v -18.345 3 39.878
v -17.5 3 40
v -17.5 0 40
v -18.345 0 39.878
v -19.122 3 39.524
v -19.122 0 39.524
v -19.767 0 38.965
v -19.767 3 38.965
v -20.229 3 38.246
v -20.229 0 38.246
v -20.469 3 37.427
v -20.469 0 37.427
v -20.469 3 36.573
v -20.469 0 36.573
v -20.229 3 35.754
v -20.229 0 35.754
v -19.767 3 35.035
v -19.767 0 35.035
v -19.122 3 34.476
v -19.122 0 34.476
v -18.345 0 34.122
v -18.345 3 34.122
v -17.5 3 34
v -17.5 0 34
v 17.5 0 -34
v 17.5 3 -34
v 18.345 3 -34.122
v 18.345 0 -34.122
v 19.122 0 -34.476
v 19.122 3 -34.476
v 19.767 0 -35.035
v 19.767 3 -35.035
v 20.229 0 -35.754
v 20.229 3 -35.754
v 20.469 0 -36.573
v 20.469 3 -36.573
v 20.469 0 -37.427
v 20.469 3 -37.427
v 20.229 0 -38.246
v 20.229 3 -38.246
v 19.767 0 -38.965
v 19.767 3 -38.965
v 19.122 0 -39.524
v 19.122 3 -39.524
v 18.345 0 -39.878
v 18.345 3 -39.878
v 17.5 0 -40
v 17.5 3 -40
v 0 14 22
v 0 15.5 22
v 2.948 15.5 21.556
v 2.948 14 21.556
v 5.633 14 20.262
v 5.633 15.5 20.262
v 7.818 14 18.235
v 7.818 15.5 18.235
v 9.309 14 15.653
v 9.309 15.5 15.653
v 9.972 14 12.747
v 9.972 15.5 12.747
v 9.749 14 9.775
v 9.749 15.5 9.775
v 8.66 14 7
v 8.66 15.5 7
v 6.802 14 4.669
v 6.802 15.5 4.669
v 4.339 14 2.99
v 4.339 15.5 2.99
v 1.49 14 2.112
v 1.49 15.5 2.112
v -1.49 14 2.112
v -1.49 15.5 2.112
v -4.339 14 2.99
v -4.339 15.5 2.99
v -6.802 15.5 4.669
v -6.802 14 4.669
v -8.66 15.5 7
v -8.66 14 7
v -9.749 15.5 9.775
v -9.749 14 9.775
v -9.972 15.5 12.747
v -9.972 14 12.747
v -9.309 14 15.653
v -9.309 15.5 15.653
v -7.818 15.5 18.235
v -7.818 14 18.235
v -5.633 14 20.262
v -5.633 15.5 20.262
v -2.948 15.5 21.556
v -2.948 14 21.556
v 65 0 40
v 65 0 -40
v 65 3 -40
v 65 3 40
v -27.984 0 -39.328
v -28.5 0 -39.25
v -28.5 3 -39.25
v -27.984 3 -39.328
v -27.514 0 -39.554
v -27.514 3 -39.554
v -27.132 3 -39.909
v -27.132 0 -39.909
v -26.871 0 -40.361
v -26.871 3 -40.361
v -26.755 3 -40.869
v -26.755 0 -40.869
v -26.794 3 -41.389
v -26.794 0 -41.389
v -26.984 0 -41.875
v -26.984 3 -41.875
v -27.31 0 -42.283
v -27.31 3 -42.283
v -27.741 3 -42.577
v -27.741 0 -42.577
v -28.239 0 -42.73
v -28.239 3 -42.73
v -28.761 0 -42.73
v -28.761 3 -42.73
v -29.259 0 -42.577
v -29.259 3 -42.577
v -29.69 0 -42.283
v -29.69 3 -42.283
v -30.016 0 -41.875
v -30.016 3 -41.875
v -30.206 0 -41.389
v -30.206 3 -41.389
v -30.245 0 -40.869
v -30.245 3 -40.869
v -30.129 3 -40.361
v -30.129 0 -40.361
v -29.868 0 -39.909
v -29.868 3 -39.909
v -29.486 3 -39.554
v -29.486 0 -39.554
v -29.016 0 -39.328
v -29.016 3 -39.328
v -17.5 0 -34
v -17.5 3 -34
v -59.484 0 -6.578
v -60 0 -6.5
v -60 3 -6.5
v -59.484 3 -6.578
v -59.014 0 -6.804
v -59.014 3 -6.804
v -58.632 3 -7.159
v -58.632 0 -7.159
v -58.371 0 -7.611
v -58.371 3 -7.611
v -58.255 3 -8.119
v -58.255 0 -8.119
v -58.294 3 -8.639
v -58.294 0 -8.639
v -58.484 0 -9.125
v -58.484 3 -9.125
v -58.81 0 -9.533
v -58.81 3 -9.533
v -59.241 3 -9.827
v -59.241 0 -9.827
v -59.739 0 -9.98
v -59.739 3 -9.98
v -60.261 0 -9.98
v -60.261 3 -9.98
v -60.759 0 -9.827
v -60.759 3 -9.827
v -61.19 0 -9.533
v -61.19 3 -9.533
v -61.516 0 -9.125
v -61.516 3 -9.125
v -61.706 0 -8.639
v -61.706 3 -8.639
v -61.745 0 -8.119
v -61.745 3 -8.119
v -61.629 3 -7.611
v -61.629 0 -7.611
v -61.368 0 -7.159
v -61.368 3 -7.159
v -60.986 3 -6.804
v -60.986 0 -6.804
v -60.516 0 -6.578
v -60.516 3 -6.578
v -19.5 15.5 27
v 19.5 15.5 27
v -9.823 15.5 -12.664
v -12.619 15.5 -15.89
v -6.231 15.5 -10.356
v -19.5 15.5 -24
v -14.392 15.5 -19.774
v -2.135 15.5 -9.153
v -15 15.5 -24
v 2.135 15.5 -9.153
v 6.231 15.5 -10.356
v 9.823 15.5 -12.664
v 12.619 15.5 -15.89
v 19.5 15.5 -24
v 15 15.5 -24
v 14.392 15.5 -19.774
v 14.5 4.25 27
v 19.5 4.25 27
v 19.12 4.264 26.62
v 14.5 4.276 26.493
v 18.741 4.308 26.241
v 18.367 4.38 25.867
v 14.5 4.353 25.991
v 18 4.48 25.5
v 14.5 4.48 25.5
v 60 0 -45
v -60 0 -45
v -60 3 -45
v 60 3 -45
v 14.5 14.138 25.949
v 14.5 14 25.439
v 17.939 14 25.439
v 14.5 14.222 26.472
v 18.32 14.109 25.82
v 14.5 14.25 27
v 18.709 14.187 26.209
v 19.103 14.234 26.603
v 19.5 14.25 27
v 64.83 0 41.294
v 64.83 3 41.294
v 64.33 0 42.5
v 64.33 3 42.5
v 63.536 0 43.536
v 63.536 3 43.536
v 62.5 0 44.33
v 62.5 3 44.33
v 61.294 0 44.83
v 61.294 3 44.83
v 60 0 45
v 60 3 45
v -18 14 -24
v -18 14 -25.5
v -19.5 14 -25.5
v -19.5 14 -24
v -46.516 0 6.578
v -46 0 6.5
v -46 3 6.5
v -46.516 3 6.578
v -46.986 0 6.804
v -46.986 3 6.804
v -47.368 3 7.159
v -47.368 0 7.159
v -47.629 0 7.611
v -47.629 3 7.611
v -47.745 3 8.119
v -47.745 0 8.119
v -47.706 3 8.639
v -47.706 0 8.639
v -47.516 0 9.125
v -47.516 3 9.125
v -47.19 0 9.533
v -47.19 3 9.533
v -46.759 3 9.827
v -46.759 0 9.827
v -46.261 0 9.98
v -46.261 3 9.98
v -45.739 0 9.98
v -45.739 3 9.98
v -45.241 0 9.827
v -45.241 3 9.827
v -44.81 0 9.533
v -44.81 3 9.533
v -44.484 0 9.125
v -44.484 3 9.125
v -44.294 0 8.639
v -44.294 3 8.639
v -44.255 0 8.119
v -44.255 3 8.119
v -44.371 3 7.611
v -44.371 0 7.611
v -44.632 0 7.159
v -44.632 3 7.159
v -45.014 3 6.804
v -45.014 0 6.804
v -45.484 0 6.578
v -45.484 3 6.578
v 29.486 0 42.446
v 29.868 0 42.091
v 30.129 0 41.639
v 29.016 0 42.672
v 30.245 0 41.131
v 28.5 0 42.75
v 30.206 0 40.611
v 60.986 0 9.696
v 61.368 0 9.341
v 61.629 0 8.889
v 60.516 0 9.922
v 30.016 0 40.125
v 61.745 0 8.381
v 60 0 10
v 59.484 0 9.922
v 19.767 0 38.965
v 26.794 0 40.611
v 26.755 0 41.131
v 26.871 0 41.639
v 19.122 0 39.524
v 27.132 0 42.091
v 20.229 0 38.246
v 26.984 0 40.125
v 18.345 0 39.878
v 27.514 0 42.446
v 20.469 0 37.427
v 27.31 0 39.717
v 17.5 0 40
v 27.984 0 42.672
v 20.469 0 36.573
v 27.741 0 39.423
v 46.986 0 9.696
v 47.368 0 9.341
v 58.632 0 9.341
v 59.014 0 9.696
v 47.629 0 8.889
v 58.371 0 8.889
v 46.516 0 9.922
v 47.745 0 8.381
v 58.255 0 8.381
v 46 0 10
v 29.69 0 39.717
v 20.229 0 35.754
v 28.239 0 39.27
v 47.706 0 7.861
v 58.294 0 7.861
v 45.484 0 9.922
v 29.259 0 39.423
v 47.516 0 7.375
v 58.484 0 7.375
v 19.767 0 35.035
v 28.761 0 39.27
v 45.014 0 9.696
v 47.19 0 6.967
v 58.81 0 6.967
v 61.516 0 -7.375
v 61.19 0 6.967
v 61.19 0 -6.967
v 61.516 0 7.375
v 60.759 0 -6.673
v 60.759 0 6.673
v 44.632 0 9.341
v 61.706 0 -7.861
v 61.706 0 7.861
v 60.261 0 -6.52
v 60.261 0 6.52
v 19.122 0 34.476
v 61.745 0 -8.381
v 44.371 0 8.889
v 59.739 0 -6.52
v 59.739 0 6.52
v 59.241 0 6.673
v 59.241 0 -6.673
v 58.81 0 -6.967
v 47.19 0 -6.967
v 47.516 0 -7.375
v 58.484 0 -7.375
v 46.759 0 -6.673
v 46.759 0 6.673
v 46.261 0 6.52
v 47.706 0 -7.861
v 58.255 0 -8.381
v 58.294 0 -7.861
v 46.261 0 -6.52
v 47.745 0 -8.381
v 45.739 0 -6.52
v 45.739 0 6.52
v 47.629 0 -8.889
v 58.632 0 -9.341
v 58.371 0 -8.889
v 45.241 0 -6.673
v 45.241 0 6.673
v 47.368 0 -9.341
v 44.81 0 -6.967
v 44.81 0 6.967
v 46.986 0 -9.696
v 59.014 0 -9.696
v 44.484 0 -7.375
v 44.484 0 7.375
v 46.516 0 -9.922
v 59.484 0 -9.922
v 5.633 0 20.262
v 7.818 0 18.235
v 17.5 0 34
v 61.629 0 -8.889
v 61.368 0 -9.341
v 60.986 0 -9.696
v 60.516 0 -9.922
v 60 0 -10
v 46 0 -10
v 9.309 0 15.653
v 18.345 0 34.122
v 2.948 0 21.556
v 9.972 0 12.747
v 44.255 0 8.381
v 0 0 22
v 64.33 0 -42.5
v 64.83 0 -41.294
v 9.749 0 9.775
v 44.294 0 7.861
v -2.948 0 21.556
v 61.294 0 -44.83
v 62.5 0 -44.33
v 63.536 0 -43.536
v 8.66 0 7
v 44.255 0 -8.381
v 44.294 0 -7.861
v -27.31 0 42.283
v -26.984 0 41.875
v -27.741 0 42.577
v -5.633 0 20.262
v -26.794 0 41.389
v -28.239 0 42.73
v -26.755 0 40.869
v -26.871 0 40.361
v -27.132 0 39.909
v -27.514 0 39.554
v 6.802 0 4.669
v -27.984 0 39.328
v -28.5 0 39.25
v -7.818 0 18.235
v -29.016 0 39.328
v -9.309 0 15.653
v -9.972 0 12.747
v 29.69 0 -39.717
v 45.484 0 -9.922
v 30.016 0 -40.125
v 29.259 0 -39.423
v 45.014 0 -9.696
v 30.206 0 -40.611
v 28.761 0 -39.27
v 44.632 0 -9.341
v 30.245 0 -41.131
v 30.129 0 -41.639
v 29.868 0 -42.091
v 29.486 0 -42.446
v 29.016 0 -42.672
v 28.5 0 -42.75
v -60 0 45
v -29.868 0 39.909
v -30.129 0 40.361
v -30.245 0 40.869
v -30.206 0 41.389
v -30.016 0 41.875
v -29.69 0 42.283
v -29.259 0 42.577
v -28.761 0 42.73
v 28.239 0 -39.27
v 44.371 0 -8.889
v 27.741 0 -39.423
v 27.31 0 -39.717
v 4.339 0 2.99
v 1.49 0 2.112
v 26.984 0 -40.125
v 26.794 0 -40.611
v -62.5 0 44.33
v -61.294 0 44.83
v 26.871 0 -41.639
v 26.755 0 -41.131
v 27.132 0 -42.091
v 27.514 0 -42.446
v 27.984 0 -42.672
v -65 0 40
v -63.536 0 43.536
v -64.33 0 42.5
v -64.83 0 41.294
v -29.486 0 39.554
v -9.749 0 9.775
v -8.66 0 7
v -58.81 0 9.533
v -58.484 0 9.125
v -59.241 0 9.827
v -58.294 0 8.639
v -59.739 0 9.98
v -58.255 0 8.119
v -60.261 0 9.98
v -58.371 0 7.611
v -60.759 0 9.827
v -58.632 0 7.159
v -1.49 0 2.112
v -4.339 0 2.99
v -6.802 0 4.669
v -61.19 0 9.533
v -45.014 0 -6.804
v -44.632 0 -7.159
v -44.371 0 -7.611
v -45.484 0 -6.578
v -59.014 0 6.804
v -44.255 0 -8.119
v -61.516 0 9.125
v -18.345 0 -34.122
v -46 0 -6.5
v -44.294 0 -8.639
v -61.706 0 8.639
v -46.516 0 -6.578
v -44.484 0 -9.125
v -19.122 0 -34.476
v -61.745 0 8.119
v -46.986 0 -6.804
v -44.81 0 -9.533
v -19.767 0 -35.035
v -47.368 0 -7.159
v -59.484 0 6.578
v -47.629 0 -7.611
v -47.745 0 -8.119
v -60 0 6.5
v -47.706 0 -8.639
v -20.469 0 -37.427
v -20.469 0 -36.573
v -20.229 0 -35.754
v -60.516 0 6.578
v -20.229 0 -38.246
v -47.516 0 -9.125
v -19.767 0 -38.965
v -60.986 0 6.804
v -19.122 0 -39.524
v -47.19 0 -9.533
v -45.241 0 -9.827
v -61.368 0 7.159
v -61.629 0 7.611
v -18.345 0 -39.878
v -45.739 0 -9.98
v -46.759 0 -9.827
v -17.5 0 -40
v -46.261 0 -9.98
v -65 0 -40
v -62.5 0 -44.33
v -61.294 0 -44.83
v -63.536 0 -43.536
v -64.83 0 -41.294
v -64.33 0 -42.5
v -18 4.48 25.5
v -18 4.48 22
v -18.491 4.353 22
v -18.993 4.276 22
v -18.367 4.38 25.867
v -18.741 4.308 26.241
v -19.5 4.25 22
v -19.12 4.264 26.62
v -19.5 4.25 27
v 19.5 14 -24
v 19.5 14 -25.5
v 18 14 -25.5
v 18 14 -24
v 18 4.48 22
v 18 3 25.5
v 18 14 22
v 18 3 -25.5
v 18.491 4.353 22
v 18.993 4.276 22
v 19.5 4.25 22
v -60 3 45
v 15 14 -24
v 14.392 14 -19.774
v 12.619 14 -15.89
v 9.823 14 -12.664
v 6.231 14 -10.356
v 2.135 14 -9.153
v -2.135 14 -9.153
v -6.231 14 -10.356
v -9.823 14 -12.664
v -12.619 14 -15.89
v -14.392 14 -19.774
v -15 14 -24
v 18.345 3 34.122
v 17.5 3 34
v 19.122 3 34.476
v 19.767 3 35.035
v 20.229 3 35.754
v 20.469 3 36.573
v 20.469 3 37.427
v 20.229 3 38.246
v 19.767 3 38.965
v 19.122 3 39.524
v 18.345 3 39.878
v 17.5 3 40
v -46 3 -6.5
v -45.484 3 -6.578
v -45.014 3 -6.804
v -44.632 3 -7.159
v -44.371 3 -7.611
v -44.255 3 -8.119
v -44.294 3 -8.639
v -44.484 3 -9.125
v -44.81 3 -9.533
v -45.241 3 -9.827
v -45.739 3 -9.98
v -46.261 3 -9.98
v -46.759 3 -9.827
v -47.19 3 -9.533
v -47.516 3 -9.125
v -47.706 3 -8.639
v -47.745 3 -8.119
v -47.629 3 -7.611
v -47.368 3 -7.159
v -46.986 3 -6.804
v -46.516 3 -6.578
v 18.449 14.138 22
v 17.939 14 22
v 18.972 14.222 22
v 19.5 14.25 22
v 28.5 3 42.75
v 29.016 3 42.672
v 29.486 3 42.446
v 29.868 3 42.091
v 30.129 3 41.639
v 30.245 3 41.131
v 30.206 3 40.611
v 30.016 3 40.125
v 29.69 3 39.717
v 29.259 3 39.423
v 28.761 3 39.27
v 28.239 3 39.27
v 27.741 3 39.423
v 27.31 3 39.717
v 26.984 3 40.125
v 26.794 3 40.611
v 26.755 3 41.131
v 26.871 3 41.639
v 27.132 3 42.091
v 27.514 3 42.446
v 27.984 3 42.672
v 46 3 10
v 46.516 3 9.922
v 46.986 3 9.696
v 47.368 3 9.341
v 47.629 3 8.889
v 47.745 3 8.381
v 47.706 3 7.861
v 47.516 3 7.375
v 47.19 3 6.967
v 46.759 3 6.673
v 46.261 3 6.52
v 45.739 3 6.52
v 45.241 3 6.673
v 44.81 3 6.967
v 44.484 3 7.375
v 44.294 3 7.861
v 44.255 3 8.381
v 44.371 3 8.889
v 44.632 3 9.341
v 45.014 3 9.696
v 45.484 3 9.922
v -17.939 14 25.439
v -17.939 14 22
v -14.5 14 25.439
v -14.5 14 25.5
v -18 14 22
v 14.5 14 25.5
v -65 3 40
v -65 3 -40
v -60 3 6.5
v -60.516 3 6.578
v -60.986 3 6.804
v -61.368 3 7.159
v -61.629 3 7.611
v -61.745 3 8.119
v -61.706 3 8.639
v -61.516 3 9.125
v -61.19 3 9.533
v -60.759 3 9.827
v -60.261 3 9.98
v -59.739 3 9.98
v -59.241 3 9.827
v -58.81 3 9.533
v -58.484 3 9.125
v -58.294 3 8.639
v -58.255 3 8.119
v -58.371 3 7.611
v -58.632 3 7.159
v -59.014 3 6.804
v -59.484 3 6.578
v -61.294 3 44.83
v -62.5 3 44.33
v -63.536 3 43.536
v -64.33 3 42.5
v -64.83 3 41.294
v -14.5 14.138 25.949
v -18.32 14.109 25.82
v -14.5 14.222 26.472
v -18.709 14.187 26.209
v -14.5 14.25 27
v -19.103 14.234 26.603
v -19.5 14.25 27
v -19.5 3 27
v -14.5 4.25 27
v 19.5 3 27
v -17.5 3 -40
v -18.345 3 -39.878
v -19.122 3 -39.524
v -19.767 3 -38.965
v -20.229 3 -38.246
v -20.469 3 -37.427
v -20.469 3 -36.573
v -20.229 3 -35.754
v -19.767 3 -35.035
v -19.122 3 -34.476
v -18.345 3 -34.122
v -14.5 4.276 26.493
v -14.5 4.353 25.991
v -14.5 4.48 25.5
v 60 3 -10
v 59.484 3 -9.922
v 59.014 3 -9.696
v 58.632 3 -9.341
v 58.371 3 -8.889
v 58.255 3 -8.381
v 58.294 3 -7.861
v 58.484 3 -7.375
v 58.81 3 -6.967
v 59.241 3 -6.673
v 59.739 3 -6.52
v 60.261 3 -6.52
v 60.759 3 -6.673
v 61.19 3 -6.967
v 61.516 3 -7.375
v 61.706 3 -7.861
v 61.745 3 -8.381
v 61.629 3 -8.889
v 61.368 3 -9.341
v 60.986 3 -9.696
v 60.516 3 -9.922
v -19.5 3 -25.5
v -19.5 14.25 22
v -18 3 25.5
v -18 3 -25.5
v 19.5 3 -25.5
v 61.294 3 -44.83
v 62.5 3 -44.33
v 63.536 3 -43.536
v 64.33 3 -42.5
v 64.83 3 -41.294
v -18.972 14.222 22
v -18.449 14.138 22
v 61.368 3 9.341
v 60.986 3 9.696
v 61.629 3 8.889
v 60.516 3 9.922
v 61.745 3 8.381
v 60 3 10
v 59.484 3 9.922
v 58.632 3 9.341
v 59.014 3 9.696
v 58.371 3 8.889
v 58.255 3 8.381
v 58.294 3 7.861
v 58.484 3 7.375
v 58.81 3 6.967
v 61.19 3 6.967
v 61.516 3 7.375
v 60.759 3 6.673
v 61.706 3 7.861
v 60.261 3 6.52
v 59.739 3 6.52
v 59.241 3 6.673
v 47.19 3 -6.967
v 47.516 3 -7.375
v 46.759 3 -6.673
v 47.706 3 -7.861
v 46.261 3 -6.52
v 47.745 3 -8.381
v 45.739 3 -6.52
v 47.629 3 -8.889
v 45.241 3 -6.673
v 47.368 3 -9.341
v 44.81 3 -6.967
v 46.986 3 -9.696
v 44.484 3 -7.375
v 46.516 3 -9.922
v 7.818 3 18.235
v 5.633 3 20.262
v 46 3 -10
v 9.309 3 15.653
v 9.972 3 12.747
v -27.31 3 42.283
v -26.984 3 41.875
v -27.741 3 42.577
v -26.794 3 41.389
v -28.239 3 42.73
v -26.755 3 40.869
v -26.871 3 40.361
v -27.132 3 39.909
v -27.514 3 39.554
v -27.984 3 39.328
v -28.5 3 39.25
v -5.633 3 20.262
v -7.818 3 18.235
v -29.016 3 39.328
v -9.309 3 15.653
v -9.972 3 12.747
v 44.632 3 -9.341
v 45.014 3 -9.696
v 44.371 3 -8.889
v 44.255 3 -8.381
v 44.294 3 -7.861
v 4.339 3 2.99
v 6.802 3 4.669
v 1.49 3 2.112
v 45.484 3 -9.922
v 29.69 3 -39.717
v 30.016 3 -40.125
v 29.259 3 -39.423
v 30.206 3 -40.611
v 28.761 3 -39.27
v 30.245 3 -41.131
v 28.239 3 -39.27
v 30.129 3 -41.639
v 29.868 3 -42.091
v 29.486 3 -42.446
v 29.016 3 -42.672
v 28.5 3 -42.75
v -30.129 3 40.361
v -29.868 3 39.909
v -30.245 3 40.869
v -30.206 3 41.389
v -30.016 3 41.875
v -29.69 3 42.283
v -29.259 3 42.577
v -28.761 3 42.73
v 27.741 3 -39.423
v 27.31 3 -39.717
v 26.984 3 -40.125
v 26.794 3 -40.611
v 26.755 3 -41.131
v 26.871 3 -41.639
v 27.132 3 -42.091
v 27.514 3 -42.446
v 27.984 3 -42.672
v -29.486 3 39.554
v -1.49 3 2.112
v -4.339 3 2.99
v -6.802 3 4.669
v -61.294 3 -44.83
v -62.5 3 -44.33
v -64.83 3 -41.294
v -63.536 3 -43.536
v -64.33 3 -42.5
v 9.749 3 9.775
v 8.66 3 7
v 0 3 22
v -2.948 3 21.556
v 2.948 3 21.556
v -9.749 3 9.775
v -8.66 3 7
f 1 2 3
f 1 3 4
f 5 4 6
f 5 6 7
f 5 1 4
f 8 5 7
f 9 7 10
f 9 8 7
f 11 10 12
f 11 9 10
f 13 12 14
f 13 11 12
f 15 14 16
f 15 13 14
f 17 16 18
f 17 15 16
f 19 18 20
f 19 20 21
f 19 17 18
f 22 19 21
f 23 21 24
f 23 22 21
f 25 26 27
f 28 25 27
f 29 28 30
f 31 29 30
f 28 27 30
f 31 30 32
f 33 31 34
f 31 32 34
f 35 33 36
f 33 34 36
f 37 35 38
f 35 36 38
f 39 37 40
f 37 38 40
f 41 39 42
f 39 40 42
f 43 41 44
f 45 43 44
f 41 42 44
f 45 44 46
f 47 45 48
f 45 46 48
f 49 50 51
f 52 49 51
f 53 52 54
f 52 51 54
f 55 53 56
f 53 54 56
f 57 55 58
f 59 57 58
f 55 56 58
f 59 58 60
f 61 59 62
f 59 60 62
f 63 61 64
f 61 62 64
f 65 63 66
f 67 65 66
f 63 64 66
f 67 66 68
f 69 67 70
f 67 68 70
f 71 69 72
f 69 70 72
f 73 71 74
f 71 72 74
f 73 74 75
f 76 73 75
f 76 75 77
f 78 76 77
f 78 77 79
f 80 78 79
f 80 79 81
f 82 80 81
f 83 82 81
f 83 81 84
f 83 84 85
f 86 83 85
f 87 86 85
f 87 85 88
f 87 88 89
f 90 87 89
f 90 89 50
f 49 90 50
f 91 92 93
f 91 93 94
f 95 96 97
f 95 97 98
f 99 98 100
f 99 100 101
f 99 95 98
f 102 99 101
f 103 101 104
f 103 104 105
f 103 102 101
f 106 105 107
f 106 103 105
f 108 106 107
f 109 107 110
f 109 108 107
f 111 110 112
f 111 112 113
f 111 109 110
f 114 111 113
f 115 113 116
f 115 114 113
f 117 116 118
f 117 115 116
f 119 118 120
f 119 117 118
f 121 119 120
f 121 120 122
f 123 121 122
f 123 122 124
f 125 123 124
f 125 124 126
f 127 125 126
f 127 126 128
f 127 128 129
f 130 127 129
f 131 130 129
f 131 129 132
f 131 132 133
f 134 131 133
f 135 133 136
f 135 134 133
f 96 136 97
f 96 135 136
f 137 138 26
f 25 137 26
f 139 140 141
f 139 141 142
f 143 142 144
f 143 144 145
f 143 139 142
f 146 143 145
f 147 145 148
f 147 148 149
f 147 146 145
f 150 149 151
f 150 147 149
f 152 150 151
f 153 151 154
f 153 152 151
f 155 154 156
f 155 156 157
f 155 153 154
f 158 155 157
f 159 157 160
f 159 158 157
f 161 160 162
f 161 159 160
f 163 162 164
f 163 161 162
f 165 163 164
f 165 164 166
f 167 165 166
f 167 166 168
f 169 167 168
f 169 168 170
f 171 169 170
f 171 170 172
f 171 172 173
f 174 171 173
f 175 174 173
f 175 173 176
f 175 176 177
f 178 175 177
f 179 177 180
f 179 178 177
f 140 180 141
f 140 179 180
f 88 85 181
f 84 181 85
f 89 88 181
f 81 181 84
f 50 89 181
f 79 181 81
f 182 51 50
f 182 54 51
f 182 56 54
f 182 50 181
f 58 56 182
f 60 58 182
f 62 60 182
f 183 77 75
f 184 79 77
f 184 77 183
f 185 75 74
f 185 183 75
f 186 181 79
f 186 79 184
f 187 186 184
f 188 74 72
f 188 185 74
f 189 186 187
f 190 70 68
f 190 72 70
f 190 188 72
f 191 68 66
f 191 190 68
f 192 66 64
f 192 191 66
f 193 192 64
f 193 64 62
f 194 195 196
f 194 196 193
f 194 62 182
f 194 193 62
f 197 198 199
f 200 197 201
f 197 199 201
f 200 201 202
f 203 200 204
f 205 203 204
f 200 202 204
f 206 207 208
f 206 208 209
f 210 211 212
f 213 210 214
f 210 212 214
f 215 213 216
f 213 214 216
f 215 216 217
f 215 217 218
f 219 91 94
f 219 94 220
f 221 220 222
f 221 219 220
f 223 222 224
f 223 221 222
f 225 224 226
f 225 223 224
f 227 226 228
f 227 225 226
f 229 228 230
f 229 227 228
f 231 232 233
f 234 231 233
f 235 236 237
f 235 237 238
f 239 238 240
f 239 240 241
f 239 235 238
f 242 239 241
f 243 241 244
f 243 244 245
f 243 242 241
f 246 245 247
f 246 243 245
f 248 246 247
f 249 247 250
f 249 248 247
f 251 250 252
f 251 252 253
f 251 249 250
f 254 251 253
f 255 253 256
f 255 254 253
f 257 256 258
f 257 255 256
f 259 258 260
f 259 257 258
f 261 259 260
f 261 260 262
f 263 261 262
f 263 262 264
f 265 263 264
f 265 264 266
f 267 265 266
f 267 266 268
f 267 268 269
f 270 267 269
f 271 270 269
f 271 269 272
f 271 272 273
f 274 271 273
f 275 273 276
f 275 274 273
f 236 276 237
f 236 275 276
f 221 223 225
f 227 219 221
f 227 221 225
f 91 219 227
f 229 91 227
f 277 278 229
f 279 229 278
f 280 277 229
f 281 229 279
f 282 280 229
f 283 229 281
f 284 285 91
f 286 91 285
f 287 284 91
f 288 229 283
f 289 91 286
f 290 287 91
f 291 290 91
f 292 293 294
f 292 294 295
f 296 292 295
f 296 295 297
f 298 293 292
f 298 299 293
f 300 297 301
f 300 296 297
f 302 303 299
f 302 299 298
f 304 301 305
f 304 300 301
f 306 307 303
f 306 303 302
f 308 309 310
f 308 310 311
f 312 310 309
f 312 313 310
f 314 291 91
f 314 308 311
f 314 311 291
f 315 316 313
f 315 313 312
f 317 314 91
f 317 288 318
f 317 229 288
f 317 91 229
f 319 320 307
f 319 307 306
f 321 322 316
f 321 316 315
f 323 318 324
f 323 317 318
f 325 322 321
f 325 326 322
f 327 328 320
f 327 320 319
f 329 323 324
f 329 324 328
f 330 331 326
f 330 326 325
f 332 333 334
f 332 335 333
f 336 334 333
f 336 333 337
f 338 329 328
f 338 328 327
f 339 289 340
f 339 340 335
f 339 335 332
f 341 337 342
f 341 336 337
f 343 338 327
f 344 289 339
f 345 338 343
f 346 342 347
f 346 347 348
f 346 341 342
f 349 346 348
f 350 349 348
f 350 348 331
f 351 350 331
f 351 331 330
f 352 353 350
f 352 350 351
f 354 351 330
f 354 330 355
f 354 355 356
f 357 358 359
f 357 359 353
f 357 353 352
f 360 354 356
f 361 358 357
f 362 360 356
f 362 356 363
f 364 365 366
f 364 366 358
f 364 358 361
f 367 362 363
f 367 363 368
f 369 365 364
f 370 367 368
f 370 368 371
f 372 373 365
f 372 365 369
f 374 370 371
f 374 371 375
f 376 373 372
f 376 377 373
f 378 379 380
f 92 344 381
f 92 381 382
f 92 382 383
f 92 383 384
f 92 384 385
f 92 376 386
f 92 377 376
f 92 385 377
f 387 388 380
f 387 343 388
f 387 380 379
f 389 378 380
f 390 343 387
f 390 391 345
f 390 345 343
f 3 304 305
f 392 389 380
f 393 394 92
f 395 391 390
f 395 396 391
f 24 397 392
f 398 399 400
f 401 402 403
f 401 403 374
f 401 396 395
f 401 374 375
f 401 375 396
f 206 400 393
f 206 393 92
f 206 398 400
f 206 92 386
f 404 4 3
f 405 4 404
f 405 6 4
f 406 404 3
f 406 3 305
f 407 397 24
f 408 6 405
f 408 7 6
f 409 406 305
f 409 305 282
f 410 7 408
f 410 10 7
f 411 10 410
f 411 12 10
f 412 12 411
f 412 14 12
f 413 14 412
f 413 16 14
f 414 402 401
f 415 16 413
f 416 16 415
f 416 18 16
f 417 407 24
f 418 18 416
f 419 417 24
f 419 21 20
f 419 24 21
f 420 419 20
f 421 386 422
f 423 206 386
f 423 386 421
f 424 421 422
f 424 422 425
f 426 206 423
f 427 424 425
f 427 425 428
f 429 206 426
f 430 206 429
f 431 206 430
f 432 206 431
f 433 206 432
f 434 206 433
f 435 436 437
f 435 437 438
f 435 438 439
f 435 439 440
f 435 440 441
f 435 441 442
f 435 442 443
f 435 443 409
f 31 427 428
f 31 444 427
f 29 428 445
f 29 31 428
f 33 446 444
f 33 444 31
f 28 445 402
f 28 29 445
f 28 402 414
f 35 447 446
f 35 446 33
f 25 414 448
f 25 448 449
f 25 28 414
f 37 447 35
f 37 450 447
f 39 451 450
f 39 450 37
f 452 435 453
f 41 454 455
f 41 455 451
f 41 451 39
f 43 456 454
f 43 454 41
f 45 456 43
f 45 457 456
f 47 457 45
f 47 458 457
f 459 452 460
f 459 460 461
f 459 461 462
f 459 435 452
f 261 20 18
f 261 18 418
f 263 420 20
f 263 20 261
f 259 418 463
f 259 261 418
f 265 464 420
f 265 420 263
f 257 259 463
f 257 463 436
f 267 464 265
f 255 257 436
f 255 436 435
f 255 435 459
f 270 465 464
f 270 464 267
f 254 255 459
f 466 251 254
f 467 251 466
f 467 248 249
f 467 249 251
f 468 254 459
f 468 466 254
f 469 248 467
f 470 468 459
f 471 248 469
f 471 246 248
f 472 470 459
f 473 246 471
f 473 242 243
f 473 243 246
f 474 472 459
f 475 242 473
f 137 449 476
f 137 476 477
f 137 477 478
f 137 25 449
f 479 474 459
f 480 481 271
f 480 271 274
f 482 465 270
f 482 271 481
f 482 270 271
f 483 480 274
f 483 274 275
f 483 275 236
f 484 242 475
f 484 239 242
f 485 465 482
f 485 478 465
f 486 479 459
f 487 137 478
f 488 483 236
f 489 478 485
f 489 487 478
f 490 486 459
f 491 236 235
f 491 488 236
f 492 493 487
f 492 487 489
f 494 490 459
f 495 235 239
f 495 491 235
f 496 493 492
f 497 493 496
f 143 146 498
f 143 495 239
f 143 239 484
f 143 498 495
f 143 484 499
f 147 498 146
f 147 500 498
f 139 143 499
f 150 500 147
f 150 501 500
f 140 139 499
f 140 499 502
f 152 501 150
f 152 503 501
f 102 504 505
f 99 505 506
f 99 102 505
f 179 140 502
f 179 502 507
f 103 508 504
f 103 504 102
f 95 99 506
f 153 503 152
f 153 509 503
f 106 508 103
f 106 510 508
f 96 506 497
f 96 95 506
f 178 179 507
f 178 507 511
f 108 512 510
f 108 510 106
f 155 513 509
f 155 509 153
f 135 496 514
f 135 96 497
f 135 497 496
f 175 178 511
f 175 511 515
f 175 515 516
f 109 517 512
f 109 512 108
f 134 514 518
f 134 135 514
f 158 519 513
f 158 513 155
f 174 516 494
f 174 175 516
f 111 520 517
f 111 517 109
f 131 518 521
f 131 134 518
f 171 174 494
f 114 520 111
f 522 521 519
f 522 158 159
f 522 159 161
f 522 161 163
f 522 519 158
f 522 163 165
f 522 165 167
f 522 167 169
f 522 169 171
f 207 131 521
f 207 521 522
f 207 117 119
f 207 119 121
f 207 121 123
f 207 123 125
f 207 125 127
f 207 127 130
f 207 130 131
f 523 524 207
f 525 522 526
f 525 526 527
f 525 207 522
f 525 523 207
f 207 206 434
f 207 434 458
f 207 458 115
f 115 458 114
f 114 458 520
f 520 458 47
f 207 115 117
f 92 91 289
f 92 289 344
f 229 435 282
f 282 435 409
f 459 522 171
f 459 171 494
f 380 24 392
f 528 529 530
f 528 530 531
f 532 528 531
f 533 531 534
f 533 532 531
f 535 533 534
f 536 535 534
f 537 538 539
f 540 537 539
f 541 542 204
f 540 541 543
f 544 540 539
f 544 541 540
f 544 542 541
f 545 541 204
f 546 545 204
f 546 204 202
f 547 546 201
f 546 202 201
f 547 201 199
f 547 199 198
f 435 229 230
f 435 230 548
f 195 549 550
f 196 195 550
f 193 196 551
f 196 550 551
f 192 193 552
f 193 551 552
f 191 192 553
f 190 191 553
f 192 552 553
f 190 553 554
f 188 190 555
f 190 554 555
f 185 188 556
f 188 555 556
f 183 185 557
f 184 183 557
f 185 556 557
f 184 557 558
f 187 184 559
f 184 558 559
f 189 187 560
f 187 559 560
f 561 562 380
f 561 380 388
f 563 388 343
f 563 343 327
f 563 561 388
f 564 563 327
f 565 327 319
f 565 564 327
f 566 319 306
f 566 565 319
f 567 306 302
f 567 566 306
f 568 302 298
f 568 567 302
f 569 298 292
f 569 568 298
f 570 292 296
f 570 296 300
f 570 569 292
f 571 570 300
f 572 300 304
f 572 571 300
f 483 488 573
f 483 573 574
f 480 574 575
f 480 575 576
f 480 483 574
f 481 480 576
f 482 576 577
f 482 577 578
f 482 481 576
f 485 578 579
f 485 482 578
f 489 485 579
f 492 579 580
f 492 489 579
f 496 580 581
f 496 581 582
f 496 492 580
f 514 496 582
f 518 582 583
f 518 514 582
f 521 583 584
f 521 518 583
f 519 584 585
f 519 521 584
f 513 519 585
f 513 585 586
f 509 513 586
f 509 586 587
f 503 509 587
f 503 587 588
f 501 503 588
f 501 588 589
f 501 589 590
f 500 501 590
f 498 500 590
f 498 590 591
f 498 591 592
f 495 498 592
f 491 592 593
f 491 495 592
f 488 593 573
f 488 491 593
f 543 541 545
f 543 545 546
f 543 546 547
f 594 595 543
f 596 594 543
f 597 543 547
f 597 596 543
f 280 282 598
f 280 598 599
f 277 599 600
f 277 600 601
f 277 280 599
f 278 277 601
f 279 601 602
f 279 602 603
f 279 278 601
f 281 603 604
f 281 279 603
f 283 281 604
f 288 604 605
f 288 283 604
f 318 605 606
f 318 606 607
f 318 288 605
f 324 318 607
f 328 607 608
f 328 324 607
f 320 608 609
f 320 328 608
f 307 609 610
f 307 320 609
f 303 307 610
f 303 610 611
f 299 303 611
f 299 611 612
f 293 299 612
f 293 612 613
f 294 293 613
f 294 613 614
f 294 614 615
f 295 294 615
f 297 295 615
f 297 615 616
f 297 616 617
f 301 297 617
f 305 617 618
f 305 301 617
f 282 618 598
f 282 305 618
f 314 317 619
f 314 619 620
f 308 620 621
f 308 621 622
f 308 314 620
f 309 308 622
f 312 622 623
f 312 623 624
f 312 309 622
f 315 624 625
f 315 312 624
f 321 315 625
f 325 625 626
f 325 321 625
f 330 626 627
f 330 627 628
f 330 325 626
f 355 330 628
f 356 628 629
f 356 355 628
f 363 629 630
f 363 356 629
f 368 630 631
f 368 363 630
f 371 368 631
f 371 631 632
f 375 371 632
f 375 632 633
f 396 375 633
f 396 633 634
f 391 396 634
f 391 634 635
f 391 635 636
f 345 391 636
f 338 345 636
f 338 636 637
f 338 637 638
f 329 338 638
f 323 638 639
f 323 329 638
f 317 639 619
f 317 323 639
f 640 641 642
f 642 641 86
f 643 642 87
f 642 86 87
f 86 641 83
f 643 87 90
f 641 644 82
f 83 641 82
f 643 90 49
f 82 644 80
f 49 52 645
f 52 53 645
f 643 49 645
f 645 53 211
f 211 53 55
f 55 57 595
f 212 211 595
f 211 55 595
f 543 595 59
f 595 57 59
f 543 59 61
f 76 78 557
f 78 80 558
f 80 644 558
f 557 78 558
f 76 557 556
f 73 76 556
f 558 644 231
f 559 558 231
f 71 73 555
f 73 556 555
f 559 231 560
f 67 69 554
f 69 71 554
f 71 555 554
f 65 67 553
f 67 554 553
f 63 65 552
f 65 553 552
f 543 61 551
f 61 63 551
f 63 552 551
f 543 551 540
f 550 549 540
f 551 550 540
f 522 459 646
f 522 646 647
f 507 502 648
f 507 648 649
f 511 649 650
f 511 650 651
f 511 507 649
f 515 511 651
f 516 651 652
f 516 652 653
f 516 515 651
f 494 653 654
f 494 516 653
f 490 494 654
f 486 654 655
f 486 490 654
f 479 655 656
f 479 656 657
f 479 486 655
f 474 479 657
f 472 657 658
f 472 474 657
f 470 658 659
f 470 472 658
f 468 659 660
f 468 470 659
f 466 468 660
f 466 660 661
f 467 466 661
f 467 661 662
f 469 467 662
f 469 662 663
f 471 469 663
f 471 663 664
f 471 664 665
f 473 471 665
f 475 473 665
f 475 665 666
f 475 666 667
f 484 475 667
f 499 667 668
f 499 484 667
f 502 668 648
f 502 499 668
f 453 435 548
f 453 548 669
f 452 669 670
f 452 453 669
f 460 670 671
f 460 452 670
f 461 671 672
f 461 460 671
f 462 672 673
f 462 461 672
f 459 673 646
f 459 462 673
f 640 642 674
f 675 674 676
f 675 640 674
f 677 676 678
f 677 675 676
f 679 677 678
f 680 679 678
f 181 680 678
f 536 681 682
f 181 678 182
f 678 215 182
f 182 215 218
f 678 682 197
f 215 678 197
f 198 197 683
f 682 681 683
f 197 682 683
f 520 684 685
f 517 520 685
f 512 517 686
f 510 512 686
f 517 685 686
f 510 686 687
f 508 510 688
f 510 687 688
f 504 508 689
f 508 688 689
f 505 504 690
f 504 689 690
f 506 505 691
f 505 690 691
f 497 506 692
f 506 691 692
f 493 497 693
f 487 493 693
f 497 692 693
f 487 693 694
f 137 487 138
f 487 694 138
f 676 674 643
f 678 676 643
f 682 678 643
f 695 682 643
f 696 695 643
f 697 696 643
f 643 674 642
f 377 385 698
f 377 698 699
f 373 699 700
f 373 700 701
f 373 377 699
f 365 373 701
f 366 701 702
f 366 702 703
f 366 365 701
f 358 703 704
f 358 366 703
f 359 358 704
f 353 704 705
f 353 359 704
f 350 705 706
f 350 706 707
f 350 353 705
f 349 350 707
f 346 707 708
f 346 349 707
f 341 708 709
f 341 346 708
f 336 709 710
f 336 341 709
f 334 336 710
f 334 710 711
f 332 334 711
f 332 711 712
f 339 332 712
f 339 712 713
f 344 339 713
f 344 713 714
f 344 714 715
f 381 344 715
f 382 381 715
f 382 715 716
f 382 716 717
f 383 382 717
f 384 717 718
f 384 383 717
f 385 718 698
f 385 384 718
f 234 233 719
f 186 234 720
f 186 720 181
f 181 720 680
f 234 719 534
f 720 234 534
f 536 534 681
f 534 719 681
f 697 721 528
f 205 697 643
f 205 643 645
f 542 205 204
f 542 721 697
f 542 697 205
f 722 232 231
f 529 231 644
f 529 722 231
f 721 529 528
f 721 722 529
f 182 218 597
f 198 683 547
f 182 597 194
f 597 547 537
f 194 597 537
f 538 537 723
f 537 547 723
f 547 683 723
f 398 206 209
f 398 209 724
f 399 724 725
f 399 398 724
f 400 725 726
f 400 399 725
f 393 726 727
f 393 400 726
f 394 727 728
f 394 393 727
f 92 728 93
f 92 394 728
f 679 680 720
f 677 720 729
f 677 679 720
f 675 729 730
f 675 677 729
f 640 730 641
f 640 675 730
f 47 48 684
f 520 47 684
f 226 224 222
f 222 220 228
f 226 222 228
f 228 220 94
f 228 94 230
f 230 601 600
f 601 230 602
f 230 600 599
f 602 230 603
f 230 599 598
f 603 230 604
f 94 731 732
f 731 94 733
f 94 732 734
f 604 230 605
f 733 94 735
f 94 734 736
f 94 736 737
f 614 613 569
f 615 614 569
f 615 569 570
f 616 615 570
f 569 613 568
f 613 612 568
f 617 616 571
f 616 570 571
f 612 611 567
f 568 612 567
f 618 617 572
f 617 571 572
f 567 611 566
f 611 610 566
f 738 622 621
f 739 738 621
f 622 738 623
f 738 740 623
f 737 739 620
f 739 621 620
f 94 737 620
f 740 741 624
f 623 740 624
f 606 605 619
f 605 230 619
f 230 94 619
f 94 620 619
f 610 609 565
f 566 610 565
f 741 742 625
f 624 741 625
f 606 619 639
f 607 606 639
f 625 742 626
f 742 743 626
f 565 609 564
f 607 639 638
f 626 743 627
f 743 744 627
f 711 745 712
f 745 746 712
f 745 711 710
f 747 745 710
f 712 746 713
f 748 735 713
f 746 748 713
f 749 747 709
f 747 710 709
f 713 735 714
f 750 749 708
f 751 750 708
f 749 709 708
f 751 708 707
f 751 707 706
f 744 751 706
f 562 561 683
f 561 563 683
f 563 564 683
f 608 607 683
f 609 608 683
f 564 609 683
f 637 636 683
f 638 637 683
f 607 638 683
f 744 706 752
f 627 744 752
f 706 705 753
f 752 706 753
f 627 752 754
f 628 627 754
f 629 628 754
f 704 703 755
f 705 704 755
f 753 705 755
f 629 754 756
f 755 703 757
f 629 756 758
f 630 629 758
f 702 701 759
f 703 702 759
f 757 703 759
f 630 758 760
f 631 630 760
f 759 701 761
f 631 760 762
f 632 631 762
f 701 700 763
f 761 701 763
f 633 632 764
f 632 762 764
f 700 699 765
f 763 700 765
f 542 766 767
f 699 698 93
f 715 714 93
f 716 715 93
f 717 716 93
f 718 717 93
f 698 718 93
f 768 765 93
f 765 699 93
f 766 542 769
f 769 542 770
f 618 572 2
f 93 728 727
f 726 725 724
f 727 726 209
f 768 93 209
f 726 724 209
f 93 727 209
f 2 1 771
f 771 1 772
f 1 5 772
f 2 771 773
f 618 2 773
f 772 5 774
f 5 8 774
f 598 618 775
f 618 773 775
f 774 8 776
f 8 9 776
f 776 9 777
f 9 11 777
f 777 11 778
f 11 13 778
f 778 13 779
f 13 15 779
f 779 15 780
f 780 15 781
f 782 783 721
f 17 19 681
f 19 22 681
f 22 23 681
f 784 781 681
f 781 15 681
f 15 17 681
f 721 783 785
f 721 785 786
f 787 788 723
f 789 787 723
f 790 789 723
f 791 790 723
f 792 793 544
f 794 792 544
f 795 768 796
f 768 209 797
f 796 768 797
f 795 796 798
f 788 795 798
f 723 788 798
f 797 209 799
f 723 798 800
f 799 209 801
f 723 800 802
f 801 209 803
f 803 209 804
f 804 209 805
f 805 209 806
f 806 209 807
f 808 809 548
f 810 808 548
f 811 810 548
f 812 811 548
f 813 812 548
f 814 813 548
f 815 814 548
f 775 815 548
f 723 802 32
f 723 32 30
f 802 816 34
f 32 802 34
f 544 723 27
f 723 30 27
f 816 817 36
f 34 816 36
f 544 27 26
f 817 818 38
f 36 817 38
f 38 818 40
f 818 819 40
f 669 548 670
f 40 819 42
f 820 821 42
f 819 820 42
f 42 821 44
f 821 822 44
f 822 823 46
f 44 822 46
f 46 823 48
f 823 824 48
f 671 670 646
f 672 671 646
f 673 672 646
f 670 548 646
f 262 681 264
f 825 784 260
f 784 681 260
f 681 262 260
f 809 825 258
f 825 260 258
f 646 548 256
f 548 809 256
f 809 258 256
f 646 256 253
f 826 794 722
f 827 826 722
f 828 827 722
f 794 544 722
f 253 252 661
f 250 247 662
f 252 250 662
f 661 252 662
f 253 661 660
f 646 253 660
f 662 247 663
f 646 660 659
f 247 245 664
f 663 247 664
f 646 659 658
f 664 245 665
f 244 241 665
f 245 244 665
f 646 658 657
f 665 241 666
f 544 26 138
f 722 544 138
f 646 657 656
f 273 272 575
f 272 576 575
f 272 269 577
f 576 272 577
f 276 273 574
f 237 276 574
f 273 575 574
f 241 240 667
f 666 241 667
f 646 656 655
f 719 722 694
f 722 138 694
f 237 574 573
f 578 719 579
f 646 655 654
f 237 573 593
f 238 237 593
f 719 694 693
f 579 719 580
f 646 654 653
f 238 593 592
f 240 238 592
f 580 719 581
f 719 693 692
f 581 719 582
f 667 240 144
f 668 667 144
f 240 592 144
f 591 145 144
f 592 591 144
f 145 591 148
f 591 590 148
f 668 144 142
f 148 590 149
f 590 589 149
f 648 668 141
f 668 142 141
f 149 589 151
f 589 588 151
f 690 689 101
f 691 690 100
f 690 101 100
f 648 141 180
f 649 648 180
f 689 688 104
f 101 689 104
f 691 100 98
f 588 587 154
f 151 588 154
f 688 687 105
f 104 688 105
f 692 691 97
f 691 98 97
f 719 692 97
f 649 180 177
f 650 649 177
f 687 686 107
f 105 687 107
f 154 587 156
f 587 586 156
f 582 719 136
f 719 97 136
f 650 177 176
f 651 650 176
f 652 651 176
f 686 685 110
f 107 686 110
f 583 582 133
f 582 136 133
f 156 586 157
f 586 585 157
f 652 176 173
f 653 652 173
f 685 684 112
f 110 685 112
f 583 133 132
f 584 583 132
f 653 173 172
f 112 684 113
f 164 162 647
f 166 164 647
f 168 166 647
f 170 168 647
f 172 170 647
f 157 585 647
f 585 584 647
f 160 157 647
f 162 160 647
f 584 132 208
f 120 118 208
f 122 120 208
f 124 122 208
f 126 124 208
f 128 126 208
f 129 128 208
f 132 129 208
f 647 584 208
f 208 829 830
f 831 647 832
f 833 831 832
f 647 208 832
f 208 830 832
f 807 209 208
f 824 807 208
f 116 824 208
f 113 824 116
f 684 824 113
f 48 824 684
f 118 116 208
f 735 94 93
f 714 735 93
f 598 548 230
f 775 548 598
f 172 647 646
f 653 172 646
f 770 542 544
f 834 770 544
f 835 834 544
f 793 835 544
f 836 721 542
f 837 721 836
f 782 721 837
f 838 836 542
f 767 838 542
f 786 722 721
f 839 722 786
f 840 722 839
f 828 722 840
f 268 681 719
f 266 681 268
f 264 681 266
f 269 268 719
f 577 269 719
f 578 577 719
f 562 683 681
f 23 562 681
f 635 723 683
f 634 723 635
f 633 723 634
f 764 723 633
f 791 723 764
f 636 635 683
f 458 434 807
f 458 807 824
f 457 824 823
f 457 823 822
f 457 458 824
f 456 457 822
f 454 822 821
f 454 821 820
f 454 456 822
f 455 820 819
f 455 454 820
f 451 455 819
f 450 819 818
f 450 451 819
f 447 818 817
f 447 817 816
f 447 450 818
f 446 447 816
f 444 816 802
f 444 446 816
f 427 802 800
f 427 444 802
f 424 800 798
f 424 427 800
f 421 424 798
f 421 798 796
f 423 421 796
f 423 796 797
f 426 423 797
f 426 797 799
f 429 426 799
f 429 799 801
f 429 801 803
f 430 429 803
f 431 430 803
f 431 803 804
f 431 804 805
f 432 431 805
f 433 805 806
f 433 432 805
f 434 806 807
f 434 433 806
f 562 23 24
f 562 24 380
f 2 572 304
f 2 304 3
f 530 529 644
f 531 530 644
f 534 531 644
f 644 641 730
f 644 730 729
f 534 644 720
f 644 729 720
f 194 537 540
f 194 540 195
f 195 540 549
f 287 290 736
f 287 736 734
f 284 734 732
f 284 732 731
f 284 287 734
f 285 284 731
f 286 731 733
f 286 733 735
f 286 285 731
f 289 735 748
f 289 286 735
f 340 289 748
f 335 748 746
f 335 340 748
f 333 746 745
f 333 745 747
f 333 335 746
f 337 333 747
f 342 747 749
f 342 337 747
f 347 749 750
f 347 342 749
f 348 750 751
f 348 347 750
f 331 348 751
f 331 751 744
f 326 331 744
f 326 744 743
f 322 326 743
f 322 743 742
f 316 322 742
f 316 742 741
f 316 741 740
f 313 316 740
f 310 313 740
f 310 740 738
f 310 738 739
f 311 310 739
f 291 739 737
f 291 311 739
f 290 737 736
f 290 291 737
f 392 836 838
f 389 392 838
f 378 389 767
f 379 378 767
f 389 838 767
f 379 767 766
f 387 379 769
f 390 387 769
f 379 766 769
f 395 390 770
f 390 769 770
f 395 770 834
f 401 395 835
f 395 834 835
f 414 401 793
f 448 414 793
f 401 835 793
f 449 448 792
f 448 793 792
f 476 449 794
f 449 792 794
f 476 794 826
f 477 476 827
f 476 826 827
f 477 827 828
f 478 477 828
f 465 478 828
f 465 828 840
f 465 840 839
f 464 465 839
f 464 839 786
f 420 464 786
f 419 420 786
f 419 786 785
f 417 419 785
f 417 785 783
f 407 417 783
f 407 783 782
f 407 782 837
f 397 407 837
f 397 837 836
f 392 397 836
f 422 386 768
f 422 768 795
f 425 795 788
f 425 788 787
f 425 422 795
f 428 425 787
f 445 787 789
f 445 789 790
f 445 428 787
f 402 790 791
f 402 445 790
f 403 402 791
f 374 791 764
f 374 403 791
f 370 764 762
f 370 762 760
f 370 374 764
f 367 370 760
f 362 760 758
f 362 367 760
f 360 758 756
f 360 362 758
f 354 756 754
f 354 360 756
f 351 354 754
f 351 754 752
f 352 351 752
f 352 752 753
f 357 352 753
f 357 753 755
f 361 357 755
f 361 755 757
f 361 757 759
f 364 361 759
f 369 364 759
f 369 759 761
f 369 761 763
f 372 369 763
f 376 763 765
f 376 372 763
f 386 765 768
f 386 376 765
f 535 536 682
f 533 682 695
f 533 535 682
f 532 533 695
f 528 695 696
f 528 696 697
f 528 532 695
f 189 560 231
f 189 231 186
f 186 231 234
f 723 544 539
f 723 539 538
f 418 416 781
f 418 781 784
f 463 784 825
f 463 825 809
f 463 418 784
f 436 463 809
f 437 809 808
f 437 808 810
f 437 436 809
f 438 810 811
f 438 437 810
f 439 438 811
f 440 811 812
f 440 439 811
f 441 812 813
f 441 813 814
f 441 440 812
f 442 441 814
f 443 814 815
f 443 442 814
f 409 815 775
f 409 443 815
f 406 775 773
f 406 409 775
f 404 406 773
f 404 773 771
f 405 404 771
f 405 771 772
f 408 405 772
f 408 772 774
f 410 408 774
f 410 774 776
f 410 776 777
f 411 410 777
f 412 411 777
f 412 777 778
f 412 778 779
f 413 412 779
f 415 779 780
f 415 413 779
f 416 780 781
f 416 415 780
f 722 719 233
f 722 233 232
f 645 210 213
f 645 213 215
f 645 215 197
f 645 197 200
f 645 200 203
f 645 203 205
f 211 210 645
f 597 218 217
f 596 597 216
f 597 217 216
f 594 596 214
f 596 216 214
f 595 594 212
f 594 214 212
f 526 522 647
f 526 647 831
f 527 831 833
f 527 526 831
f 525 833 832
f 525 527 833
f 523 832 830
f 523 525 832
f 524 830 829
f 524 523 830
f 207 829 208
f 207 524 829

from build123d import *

# Parameters (mm, degrees)
SKETCH_1_R          = 1.75
EXTRUDE_1_DEPTH     = 3
EXTRUDE_2_DEPTH     = 11
EXTRUDE_3_DEPTH     = 1.5
SKETCH_5_R          = 10
CUT_EXTRUDE_1_DEPTH = 81.562087858
SKETCH_6_R          = 5
CUT_EXTRUDE_2_DEPTH = 5
SKETCH_7_R          = 5
CUT_EXTRUDE_3_DEPTH = 5
CUT_EXTRUDE_4_DEPTH = 3


with BuildPart() as part:
    # 草图1 → 凸台-拉伸1 (new body)
    with BuildSketch(Plane(origin=(0, 0, 0), x_dir=(1, 0, 0), z_dir=(0, 1, 0))):
        with BuildLine():
            Line((-60, 45), (60, 45))
            ThreePointArc((60, 45), (63.535533906, 43.535533906), (65, 40))
            Line((65, 40), (65, -40))
            ThreePointArc((65, -40), (63.535533906, -43.535533906), (60, -45))
            Line((60, -45), (-60, -45))
            ThreePointArc((-60, -45), (-63.535533906, -43.535533906), (-65, -40))
            Line((-65, -40), (-65, 40))
            ThreePointArc((-65, 40), (-63.535533906, 43.535533906), (-60, 45))
        make_face()
        with Locations(Location((-60, 8.25, 0), (0, 0, 270))):
            Circle(SKETCH_1_R, mode=Mode.SUBTRACT)
        with Locations(Location((-46, 8.25, 0), (0, 0, 270))):
            Circle(SKETCH_1_R, mode=Mode.SUBTRACT)
        with Locations(Location((-46, -8.25, 0), (0, 0, 90))):
            Circle(SKETCH_1_R, mode=Mode.SUBTRACT)
        with Locations(Location((-60, -8.25, 0), (0, 0, 90))):
            Circle(SKETCH_1_R, mode=Mode.SUBTRACT)
        with Locations(Location((60, 8.25, 0), (0, 0, 90))):
            Circle(SKETCH_1_R, mode=Mode.SUBTRACT)
        with Locations(Location((60, -8.25, 0), (0, 0, 270))):
            Circle(SKETCH_1_R, mode=Mode.SUBTRACT)
        with Locations(Location((46, -8.25, 0), (0, 0, 270))):
            Circle(SKETCH_1_R, mode=Mode.SUBTRACT)
        with Locations(Location((46, 8.25, 0), (0, 0, 90))):
            Circle(SKETCH_1_R, mode=Mode.SUBTRACT)
        with Locations(Location((-28.5, 41, 0), (0, 0, 270))):
            Circle(SKETCH_1_R, mode=Mode.SUBTRACT)
        with Locations(Location((-28.5, -41, 0), (0, 0, 90))):
            Circle(SKETCH_1_R, mode=Mode.SUBTRACT)
        with Locations(Location((28.5, -41, 0), (0, 0, 270))):
            Circle(SKETCH_1_R, mode=Mode.SUBTRACT)
        with Locations(Location((28.5, 41, 0), (0, 0, 90))):
            Circle(SKETCH_1_R, mode=Mode.SUBTRACT)
    extrude(amount=EXTRUDE_1_DEPTH)

    # 草图2 → 凸台-拉伸2 (add)
    with BuildSketch(Plane(origin=(0, 3, 0), x_dir=(1, 0, 0), z_dir=(0, 1, 0))):
        Polygon((18, 25.5), (19.5, 25.5), (19.5, -27), (-19.5, -27), (-19.5, 25.5), (-18, 25.5), (-18, -25.5), (18, -25.5), align=None)
    extrude(amount=EXTRUDE_2_DEPTH)

    # 草图3 → 凸台-拉伸3 (add)
    with BuildSketch(Plane(origin=(0, 14, 0), x_dir=(1, 0, 0), z_dir=(0, 1, 0))):
        with BuildLine():
            Line((-15, 24), (-18, 24))
            Line((-18, 24), (-18, -25.5))
            Line((-18, -25.5), (18, -25.5))
            Line((18, -25.5), (18, 24))
            Line((18, 24), (15, 24))
            ThreePointArc((15, 24), (0, 9), (-15, 24))
        make_face()
        Polygon((-18, 24), (-19.5, 24), (-19.5, -27), (19.5, -27), (19.5, 24), (18, 24), (18, -25.5), (-18, -25.5), align=None)
    extrude(amount=EXTRUDE_3_DEPTH)

    # 草图5 → 切除-拉伸1 (cut, through all)
    with BuildSketch(Plane(origin=(0, 15.5, 0), x_dir=(1, 0, 0), z_dir=(0, 1, 0))):
        with Locations(Location((0, -12, 0), (0, 0, 270))):
            Circle(SKETCH_5_R)
    extrude(amount=-CUT_EXTRUDE_1_DEPTH, mode=Mode.SUBTRACT)

    # 草图6 → 切除-拉伸2 (cut)
    with BuildSketch(Plane(origin=(19.5, 0, 0), x_dir=(0, 0, -1), z_dir=(1, 0, 0))):
        with Locations((-27, 9.25)):
            Circle(SKETCH_6_R)
    cut_extrude_2 = extrude(amount=-CUT_EXTRUDE_2_DEPTH, mode=Mode.SUBTRACT)

    # 草图7 → 切除-拉伸3 (cut)
    with BuildSketch(Plane.XY.offset(27)):
        with Locations((19.5, 9.25)):
            Circle(SKETCH_7_R)
    cut_extrude_3 = extrude(amount=-CUT_EXTRUDE_3_DEPTH, mode=Mode.SUBTRACT)

    # 镜向1: 切除-拉伸2, 切除-拉伸3 across plane
    add(cut_extrude_2.mirror(Plane(origin=(0, 0, 0), x_dir=(0, 0, 1), z_dir=(1, 0, 0))), mode=Mode.SUBTRACT)
    add(cut_extrude_3.mirror(Plane(origin=(0, 0, 0), x_dir=(0, 0, 1), z_dir=(1, 0, 0))), mode=Mode.SUBTRACT)

    # 草图8 → 切除-拉伸4 (cut)
    with BuildSketch(Plane(origin=(0, 3, 0), x_dir=(1, 0, 0), z_dir=(0, 1, 0))):
        with BuildLine():
            Line((-17.5, -34), (17.5, -34))
            ThreePointArc((17.5, -34), (20.5, -37), (17.5, -40))
            Line((17.5, -40), (-17.5, -40))
            ThreePointArc((-17.5, -40), (-20.5, -37), (-17.5, -34))
        make_face()
    cut_extrude_4 = extrude(amount=-CUT_EXTRUDE_4_DEPTH, mode=Mode.SUBTRACT)

    # 镜向2: 切除-拉伸4 across plane
    add(cut_extrude_4.mirror(Plane.XY), mode=Mode.SUBTRACT)


solid = part.part
